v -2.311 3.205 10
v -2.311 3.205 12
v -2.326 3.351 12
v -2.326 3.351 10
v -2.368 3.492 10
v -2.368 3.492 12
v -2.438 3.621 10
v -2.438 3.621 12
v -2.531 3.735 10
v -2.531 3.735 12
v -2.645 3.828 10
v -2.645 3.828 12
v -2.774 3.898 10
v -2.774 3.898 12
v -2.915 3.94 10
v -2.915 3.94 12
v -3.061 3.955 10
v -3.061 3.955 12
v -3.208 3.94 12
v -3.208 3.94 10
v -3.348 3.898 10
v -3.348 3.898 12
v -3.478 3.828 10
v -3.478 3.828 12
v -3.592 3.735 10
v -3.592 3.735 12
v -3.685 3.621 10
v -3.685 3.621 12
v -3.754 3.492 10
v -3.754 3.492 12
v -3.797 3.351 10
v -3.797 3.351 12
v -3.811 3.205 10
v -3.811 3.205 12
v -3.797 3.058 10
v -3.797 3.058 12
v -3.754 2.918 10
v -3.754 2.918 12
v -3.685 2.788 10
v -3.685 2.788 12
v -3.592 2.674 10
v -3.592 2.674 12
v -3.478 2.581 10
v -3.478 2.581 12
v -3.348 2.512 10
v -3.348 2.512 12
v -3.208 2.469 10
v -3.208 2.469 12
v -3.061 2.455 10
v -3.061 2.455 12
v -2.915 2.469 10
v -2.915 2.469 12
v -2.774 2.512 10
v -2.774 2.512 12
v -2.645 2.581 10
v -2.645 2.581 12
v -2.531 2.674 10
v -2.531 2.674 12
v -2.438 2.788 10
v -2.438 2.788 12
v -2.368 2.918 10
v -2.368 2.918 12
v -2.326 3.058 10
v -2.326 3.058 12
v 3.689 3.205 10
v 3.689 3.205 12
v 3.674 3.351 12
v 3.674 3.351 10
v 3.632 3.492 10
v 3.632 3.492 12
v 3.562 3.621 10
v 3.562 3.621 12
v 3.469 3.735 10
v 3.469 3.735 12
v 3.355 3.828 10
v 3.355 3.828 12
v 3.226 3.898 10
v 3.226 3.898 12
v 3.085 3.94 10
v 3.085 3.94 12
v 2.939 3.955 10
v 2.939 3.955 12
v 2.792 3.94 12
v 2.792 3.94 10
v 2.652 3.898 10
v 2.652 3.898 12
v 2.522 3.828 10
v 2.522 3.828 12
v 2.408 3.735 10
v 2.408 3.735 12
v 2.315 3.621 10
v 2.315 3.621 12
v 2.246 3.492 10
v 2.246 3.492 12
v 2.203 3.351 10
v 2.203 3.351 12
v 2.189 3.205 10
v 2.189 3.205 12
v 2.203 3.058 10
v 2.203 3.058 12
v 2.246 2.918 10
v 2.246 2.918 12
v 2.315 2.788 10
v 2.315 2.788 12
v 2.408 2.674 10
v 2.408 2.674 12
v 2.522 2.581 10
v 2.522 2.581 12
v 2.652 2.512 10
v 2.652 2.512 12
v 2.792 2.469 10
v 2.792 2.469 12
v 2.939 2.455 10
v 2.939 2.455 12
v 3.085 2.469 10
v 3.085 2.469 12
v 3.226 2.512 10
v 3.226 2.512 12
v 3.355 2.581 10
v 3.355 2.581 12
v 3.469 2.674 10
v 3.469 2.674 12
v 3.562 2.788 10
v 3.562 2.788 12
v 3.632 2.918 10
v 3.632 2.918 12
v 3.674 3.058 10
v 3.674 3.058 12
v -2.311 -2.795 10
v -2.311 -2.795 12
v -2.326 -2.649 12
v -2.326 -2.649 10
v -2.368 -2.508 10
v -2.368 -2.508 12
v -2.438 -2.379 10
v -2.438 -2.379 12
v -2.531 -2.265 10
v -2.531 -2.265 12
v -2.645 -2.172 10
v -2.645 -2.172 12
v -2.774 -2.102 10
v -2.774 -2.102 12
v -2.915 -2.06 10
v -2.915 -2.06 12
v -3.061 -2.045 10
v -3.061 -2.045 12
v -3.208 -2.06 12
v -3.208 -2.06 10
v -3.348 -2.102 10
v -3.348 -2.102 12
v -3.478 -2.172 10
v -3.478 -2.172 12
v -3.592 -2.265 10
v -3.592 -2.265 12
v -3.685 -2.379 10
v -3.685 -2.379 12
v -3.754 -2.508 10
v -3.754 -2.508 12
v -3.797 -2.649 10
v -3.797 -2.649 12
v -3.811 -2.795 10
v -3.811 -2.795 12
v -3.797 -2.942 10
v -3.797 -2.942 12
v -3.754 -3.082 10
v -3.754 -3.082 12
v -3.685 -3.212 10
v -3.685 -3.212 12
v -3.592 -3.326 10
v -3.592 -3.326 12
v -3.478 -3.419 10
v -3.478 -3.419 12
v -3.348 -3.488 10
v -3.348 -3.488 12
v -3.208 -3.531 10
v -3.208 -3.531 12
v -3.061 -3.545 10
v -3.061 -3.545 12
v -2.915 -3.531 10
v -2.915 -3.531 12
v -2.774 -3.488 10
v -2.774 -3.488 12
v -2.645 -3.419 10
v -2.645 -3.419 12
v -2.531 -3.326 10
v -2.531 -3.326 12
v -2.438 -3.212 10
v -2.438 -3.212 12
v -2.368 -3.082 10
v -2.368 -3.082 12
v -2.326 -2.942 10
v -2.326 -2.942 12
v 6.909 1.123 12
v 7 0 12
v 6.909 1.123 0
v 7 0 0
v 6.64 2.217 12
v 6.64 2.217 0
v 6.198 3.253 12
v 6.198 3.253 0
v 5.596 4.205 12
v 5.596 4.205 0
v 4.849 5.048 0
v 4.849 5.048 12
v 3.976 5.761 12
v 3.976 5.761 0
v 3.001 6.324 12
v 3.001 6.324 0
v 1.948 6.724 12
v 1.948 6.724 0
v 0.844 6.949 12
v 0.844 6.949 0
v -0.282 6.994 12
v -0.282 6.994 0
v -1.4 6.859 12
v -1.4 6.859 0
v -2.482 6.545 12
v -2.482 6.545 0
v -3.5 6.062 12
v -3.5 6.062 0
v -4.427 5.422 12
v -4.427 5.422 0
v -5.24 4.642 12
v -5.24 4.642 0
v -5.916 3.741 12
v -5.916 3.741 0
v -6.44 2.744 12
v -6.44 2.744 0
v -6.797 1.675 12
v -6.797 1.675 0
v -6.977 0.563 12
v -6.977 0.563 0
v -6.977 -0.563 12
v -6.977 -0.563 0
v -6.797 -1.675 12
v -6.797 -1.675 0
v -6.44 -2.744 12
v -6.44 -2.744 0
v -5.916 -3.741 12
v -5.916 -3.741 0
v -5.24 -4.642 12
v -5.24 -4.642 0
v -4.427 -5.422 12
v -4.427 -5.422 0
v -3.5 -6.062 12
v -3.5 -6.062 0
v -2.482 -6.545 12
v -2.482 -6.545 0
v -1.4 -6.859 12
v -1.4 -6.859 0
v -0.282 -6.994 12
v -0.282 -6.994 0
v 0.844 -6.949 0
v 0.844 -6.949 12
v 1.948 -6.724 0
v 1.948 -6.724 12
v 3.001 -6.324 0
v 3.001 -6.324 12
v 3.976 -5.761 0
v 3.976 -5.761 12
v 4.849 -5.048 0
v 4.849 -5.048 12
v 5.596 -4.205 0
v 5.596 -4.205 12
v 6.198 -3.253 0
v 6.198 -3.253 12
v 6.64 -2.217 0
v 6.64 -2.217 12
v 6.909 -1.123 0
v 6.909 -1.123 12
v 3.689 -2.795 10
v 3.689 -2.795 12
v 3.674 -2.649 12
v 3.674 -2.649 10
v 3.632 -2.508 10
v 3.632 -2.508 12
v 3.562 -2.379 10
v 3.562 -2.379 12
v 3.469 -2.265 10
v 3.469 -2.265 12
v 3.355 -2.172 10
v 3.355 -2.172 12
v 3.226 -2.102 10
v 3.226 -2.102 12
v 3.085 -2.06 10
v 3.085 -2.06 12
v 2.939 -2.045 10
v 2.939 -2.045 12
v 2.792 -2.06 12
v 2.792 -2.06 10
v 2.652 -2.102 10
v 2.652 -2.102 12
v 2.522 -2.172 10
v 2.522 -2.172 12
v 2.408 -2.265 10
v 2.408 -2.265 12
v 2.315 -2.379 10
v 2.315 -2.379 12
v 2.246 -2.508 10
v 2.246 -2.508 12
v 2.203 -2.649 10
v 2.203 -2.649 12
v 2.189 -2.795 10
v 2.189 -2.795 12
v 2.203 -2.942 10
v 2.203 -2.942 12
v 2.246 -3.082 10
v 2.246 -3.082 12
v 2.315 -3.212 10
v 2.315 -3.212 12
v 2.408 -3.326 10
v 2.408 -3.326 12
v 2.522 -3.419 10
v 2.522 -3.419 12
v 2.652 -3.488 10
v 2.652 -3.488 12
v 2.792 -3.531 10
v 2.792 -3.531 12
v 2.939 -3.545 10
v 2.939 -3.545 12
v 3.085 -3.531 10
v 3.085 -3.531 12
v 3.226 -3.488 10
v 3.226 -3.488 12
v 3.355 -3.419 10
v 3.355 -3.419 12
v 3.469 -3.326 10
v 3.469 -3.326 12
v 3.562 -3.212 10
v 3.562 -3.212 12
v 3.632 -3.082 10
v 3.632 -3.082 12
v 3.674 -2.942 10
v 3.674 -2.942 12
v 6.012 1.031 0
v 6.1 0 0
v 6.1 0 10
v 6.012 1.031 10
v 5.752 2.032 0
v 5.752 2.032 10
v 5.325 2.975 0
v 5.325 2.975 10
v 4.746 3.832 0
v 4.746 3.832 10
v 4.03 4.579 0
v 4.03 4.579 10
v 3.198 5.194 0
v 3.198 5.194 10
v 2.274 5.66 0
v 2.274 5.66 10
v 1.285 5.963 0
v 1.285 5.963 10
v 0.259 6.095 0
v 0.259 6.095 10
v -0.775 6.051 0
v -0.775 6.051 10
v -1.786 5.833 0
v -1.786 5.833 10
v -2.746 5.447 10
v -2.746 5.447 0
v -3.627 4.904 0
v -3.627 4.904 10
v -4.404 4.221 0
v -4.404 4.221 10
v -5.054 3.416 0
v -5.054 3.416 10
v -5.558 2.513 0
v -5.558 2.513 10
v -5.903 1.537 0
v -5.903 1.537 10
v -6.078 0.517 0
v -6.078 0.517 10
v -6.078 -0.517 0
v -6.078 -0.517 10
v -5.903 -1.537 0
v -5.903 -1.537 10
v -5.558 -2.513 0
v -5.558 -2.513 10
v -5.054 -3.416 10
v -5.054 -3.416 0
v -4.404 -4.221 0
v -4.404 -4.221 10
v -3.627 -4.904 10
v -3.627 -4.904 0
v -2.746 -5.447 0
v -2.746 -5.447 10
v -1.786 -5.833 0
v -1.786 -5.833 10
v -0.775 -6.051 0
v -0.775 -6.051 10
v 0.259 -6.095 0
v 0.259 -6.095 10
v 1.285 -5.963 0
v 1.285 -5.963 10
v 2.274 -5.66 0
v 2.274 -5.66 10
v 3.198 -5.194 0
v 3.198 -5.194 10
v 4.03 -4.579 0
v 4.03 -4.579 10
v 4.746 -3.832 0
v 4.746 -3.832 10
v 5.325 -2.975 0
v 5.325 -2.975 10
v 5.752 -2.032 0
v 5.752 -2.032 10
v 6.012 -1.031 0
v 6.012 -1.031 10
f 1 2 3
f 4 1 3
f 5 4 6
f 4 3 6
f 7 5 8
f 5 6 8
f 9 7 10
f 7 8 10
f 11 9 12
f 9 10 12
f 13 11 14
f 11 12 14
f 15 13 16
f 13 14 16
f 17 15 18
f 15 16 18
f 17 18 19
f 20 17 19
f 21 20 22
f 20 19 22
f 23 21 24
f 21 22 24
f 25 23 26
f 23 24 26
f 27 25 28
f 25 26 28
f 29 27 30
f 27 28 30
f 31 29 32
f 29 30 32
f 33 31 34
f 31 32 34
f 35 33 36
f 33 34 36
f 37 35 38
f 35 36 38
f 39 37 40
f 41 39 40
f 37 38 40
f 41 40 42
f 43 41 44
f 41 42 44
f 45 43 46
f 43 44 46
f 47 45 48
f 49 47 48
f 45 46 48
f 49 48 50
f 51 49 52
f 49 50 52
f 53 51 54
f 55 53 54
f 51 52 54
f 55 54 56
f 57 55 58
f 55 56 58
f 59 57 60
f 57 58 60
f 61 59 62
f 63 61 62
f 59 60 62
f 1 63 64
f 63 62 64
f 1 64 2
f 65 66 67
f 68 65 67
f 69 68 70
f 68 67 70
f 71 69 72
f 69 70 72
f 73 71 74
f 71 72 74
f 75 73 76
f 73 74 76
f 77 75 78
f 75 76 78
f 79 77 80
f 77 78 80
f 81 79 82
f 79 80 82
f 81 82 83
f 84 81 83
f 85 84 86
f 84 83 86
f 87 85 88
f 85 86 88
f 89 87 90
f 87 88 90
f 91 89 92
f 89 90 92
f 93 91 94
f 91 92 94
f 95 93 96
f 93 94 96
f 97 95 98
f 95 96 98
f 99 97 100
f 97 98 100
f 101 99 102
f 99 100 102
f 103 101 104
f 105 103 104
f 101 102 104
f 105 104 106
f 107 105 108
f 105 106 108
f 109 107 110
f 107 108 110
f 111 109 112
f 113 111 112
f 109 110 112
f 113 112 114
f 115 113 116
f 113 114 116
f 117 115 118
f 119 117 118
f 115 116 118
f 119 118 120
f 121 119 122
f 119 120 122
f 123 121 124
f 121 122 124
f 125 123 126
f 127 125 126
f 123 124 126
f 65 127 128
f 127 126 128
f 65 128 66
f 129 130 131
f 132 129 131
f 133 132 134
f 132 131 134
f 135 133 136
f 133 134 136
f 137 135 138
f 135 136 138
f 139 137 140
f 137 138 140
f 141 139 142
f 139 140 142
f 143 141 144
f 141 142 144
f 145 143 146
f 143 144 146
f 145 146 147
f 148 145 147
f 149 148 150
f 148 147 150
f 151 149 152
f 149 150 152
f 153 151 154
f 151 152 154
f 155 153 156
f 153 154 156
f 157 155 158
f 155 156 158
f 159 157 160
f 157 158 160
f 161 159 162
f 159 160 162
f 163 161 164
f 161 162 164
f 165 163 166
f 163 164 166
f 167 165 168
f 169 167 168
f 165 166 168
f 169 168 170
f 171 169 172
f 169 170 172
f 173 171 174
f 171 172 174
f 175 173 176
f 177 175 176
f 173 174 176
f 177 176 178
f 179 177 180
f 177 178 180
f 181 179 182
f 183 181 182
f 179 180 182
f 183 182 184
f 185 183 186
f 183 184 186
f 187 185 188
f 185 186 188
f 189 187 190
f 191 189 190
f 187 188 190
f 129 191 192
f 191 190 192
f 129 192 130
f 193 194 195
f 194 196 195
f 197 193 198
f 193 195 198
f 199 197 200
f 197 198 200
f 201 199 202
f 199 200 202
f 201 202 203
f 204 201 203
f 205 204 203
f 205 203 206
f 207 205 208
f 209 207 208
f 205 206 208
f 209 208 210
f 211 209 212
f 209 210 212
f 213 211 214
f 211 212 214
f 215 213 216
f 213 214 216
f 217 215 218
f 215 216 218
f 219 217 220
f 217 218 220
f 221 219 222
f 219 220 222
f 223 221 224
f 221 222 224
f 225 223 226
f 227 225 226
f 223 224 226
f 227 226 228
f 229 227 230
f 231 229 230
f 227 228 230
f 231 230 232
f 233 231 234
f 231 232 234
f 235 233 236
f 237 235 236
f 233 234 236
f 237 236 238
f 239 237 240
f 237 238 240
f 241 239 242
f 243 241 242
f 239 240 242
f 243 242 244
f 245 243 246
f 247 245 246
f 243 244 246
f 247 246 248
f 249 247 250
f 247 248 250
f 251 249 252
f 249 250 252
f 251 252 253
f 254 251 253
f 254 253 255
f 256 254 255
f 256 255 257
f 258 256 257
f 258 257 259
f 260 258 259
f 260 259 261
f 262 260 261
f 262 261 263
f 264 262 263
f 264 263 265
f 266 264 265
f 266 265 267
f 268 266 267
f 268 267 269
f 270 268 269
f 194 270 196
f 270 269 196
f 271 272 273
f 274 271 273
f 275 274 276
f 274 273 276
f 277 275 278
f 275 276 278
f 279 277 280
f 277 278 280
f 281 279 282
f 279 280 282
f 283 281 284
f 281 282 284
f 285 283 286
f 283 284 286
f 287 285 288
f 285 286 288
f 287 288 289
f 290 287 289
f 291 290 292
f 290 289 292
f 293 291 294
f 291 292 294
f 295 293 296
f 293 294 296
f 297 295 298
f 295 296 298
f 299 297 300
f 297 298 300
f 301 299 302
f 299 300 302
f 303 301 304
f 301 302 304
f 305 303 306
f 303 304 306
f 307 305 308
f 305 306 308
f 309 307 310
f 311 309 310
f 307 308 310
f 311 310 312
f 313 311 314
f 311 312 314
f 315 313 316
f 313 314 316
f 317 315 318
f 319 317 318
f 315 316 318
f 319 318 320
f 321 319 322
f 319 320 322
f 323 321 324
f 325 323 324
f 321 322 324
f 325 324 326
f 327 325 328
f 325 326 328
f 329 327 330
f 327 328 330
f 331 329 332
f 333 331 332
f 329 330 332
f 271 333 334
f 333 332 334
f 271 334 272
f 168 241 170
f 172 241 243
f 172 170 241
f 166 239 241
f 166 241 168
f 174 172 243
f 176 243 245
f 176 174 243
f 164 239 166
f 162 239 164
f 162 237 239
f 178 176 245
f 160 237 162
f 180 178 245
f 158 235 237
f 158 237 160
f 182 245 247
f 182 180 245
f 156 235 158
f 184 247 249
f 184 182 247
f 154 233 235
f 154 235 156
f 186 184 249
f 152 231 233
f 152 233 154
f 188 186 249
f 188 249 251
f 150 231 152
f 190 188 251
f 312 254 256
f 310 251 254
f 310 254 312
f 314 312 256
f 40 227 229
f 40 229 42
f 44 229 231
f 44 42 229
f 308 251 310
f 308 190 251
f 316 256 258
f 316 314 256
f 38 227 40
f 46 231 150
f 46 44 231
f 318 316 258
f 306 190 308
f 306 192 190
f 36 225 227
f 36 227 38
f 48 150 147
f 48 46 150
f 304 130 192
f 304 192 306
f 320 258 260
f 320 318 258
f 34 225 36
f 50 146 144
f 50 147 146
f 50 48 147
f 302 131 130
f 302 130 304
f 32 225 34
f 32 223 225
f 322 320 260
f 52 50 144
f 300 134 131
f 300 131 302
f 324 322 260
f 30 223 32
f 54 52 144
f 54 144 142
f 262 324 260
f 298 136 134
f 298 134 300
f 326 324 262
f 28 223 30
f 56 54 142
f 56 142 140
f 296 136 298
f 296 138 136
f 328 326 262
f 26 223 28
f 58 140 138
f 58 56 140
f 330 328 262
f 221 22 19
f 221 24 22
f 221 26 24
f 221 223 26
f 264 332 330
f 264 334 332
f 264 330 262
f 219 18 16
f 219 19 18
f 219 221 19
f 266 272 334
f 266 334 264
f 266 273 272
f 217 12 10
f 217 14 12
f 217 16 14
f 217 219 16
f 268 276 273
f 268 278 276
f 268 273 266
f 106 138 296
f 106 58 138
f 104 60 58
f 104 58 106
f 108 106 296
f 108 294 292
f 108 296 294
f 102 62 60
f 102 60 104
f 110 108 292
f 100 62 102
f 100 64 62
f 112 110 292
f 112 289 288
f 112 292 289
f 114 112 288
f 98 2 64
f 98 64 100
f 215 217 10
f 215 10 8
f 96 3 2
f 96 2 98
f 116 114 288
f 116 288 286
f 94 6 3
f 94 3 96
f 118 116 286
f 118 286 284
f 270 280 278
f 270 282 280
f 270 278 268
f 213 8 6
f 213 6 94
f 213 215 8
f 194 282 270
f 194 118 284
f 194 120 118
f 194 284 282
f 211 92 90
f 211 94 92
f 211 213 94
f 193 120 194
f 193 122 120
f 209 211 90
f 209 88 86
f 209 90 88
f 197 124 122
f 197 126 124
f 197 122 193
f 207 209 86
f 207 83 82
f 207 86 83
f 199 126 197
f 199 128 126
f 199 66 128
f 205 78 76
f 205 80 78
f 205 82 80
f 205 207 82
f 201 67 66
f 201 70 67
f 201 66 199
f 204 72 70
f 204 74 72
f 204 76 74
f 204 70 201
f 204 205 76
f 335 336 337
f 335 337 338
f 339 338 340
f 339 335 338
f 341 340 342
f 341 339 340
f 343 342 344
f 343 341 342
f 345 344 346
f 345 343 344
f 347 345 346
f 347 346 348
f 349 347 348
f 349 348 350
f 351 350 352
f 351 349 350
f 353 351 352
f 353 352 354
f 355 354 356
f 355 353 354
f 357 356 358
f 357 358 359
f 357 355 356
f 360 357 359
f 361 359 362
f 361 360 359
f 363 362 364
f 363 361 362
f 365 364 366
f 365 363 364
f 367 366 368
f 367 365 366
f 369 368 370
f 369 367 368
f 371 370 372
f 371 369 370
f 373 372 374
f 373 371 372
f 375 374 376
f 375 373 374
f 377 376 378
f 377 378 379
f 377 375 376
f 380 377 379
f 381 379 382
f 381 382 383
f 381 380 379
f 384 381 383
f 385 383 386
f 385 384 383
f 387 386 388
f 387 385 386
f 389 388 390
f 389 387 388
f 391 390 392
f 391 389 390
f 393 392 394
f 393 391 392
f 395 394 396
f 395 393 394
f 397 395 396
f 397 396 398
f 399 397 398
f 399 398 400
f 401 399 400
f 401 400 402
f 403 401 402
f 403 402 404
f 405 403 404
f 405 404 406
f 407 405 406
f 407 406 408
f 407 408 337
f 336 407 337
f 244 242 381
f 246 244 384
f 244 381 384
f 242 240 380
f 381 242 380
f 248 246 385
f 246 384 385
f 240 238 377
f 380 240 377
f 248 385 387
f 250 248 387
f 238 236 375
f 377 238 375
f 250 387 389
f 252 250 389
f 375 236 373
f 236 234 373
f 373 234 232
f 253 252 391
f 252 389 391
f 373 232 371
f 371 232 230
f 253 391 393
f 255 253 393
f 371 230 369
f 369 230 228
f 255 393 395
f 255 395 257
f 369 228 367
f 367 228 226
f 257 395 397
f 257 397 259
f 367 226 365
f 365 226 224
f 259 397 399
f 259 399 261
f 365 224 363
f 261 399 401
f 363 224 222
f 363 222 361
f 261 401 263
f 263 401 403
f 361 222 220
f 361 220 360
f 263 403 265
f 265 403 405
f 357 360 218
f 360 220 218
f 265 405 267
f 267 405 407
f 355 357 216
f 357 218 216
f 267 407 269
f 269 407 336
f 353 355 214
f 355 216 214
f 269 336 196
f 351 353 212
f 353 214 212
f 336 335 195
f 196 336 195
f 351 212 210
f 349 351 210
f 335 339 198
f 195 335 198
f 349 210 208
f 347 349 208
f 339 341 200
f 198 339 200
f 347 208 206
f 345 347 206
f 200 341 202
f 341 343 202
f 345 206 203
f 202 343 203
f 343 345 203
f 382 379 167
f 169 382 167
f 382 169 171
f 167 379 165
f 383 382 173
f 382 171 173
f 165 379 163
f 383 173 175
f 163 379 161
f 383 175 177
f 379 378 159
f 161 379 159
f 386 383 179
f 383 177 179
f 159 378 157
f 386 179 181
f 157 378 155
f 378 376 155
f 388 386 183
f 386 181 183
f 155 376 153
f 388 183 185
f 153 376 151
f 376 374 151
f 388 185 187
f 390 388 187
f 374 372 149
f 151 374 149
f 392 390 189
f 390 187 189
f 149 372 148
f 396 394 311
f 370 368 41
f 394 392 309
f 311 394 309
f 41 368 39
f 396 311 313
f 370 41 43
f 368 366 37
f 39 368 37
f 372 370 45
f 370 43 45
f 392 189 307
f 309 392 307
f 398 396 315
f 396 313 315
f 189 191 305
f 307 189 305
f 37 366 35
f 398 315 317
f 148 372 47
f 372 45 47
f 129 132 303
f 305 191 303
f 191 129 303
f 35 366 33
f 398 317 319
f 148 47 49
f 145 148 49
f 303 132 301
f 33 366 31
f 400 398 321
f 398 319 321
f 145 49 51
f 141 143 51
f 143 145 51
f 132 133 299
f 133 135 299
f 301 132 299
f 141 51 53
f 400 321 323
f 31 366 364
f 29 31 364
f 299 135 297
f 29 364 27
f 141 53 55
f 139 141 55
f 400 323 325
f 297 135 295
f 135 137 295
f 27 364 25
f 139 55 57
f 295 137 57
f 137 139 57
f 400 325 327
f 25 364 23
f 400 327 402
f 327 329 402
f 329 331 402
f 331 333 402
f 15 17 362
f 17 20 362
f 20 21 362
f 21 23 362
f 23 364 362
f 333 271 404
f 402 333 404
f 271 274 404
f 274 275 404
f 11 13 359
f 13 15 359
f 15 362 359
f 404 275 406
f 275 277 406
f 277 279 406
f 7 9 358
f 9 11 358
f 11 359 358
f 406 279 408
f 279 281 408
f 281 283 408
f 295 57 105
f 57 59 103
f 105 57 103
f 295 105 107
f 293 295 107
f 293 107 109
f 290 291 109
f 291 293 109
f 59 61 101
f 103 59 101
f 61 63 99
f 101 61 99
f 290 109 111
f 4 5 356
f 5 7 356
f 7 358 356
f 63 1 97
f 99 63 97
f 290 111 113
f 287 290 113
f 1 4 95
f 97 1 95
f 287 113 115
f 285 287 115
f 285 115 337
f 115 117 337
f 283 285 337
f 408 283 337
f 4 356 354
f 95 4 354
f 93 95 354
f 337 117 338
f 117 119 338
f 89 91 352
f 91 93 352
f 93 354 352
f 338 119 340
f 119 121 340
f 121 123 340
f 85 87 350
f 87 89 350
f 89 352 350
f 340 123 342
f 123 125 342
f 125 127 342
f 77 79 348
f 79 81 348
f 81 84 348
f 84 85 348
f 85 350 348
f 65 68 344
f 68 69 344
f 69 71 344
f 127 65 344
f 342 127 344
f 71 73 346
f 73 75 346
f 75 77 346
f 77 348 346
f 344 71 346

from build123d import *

# Parameters (mm, degrees)
F0_R     = 7
F0_R_2   = 6.1
F1_DEPTH = 10
F2_R     = 7
F3_DEPTH = 2
F4_R     = 0.75
F5_DEPTH = 2


with BuildPart() as f1:
    # F0 (on Top) → F1 (new body)
    with BuildSketch(Plane.XY):
        Circle(F0_R)
        Circle(F0_R_2, mode=Mode.SUBTRACT)
    extrude(amount=F1_DEPTH)

    # F2 (on face) → F3 (join)
    with BuildSketch(Plane.XY.offset(10)):
        Circle(F2_R)
    extrude(amount=F3_DEPTH)

    # F4 (on face) → F5 (cut, through all)
    with BuildSketch(Plane.XY.offset(12)):
        with Locations((2.938619, -2.795266)):
            Circle(F4_R)
        with Locations((2.938619, 3.204734)):
            Circle(F4_R)
        with Locations((-3.061381, -2.795266)):
            Circle(F4_R)
        with Locations((-3.061381, 3.204734)):
            Circle(F4_R)
    extrude(amount=-F5_DEPTH, mode=Mode.SUBTRACT)


solid = f1.part
